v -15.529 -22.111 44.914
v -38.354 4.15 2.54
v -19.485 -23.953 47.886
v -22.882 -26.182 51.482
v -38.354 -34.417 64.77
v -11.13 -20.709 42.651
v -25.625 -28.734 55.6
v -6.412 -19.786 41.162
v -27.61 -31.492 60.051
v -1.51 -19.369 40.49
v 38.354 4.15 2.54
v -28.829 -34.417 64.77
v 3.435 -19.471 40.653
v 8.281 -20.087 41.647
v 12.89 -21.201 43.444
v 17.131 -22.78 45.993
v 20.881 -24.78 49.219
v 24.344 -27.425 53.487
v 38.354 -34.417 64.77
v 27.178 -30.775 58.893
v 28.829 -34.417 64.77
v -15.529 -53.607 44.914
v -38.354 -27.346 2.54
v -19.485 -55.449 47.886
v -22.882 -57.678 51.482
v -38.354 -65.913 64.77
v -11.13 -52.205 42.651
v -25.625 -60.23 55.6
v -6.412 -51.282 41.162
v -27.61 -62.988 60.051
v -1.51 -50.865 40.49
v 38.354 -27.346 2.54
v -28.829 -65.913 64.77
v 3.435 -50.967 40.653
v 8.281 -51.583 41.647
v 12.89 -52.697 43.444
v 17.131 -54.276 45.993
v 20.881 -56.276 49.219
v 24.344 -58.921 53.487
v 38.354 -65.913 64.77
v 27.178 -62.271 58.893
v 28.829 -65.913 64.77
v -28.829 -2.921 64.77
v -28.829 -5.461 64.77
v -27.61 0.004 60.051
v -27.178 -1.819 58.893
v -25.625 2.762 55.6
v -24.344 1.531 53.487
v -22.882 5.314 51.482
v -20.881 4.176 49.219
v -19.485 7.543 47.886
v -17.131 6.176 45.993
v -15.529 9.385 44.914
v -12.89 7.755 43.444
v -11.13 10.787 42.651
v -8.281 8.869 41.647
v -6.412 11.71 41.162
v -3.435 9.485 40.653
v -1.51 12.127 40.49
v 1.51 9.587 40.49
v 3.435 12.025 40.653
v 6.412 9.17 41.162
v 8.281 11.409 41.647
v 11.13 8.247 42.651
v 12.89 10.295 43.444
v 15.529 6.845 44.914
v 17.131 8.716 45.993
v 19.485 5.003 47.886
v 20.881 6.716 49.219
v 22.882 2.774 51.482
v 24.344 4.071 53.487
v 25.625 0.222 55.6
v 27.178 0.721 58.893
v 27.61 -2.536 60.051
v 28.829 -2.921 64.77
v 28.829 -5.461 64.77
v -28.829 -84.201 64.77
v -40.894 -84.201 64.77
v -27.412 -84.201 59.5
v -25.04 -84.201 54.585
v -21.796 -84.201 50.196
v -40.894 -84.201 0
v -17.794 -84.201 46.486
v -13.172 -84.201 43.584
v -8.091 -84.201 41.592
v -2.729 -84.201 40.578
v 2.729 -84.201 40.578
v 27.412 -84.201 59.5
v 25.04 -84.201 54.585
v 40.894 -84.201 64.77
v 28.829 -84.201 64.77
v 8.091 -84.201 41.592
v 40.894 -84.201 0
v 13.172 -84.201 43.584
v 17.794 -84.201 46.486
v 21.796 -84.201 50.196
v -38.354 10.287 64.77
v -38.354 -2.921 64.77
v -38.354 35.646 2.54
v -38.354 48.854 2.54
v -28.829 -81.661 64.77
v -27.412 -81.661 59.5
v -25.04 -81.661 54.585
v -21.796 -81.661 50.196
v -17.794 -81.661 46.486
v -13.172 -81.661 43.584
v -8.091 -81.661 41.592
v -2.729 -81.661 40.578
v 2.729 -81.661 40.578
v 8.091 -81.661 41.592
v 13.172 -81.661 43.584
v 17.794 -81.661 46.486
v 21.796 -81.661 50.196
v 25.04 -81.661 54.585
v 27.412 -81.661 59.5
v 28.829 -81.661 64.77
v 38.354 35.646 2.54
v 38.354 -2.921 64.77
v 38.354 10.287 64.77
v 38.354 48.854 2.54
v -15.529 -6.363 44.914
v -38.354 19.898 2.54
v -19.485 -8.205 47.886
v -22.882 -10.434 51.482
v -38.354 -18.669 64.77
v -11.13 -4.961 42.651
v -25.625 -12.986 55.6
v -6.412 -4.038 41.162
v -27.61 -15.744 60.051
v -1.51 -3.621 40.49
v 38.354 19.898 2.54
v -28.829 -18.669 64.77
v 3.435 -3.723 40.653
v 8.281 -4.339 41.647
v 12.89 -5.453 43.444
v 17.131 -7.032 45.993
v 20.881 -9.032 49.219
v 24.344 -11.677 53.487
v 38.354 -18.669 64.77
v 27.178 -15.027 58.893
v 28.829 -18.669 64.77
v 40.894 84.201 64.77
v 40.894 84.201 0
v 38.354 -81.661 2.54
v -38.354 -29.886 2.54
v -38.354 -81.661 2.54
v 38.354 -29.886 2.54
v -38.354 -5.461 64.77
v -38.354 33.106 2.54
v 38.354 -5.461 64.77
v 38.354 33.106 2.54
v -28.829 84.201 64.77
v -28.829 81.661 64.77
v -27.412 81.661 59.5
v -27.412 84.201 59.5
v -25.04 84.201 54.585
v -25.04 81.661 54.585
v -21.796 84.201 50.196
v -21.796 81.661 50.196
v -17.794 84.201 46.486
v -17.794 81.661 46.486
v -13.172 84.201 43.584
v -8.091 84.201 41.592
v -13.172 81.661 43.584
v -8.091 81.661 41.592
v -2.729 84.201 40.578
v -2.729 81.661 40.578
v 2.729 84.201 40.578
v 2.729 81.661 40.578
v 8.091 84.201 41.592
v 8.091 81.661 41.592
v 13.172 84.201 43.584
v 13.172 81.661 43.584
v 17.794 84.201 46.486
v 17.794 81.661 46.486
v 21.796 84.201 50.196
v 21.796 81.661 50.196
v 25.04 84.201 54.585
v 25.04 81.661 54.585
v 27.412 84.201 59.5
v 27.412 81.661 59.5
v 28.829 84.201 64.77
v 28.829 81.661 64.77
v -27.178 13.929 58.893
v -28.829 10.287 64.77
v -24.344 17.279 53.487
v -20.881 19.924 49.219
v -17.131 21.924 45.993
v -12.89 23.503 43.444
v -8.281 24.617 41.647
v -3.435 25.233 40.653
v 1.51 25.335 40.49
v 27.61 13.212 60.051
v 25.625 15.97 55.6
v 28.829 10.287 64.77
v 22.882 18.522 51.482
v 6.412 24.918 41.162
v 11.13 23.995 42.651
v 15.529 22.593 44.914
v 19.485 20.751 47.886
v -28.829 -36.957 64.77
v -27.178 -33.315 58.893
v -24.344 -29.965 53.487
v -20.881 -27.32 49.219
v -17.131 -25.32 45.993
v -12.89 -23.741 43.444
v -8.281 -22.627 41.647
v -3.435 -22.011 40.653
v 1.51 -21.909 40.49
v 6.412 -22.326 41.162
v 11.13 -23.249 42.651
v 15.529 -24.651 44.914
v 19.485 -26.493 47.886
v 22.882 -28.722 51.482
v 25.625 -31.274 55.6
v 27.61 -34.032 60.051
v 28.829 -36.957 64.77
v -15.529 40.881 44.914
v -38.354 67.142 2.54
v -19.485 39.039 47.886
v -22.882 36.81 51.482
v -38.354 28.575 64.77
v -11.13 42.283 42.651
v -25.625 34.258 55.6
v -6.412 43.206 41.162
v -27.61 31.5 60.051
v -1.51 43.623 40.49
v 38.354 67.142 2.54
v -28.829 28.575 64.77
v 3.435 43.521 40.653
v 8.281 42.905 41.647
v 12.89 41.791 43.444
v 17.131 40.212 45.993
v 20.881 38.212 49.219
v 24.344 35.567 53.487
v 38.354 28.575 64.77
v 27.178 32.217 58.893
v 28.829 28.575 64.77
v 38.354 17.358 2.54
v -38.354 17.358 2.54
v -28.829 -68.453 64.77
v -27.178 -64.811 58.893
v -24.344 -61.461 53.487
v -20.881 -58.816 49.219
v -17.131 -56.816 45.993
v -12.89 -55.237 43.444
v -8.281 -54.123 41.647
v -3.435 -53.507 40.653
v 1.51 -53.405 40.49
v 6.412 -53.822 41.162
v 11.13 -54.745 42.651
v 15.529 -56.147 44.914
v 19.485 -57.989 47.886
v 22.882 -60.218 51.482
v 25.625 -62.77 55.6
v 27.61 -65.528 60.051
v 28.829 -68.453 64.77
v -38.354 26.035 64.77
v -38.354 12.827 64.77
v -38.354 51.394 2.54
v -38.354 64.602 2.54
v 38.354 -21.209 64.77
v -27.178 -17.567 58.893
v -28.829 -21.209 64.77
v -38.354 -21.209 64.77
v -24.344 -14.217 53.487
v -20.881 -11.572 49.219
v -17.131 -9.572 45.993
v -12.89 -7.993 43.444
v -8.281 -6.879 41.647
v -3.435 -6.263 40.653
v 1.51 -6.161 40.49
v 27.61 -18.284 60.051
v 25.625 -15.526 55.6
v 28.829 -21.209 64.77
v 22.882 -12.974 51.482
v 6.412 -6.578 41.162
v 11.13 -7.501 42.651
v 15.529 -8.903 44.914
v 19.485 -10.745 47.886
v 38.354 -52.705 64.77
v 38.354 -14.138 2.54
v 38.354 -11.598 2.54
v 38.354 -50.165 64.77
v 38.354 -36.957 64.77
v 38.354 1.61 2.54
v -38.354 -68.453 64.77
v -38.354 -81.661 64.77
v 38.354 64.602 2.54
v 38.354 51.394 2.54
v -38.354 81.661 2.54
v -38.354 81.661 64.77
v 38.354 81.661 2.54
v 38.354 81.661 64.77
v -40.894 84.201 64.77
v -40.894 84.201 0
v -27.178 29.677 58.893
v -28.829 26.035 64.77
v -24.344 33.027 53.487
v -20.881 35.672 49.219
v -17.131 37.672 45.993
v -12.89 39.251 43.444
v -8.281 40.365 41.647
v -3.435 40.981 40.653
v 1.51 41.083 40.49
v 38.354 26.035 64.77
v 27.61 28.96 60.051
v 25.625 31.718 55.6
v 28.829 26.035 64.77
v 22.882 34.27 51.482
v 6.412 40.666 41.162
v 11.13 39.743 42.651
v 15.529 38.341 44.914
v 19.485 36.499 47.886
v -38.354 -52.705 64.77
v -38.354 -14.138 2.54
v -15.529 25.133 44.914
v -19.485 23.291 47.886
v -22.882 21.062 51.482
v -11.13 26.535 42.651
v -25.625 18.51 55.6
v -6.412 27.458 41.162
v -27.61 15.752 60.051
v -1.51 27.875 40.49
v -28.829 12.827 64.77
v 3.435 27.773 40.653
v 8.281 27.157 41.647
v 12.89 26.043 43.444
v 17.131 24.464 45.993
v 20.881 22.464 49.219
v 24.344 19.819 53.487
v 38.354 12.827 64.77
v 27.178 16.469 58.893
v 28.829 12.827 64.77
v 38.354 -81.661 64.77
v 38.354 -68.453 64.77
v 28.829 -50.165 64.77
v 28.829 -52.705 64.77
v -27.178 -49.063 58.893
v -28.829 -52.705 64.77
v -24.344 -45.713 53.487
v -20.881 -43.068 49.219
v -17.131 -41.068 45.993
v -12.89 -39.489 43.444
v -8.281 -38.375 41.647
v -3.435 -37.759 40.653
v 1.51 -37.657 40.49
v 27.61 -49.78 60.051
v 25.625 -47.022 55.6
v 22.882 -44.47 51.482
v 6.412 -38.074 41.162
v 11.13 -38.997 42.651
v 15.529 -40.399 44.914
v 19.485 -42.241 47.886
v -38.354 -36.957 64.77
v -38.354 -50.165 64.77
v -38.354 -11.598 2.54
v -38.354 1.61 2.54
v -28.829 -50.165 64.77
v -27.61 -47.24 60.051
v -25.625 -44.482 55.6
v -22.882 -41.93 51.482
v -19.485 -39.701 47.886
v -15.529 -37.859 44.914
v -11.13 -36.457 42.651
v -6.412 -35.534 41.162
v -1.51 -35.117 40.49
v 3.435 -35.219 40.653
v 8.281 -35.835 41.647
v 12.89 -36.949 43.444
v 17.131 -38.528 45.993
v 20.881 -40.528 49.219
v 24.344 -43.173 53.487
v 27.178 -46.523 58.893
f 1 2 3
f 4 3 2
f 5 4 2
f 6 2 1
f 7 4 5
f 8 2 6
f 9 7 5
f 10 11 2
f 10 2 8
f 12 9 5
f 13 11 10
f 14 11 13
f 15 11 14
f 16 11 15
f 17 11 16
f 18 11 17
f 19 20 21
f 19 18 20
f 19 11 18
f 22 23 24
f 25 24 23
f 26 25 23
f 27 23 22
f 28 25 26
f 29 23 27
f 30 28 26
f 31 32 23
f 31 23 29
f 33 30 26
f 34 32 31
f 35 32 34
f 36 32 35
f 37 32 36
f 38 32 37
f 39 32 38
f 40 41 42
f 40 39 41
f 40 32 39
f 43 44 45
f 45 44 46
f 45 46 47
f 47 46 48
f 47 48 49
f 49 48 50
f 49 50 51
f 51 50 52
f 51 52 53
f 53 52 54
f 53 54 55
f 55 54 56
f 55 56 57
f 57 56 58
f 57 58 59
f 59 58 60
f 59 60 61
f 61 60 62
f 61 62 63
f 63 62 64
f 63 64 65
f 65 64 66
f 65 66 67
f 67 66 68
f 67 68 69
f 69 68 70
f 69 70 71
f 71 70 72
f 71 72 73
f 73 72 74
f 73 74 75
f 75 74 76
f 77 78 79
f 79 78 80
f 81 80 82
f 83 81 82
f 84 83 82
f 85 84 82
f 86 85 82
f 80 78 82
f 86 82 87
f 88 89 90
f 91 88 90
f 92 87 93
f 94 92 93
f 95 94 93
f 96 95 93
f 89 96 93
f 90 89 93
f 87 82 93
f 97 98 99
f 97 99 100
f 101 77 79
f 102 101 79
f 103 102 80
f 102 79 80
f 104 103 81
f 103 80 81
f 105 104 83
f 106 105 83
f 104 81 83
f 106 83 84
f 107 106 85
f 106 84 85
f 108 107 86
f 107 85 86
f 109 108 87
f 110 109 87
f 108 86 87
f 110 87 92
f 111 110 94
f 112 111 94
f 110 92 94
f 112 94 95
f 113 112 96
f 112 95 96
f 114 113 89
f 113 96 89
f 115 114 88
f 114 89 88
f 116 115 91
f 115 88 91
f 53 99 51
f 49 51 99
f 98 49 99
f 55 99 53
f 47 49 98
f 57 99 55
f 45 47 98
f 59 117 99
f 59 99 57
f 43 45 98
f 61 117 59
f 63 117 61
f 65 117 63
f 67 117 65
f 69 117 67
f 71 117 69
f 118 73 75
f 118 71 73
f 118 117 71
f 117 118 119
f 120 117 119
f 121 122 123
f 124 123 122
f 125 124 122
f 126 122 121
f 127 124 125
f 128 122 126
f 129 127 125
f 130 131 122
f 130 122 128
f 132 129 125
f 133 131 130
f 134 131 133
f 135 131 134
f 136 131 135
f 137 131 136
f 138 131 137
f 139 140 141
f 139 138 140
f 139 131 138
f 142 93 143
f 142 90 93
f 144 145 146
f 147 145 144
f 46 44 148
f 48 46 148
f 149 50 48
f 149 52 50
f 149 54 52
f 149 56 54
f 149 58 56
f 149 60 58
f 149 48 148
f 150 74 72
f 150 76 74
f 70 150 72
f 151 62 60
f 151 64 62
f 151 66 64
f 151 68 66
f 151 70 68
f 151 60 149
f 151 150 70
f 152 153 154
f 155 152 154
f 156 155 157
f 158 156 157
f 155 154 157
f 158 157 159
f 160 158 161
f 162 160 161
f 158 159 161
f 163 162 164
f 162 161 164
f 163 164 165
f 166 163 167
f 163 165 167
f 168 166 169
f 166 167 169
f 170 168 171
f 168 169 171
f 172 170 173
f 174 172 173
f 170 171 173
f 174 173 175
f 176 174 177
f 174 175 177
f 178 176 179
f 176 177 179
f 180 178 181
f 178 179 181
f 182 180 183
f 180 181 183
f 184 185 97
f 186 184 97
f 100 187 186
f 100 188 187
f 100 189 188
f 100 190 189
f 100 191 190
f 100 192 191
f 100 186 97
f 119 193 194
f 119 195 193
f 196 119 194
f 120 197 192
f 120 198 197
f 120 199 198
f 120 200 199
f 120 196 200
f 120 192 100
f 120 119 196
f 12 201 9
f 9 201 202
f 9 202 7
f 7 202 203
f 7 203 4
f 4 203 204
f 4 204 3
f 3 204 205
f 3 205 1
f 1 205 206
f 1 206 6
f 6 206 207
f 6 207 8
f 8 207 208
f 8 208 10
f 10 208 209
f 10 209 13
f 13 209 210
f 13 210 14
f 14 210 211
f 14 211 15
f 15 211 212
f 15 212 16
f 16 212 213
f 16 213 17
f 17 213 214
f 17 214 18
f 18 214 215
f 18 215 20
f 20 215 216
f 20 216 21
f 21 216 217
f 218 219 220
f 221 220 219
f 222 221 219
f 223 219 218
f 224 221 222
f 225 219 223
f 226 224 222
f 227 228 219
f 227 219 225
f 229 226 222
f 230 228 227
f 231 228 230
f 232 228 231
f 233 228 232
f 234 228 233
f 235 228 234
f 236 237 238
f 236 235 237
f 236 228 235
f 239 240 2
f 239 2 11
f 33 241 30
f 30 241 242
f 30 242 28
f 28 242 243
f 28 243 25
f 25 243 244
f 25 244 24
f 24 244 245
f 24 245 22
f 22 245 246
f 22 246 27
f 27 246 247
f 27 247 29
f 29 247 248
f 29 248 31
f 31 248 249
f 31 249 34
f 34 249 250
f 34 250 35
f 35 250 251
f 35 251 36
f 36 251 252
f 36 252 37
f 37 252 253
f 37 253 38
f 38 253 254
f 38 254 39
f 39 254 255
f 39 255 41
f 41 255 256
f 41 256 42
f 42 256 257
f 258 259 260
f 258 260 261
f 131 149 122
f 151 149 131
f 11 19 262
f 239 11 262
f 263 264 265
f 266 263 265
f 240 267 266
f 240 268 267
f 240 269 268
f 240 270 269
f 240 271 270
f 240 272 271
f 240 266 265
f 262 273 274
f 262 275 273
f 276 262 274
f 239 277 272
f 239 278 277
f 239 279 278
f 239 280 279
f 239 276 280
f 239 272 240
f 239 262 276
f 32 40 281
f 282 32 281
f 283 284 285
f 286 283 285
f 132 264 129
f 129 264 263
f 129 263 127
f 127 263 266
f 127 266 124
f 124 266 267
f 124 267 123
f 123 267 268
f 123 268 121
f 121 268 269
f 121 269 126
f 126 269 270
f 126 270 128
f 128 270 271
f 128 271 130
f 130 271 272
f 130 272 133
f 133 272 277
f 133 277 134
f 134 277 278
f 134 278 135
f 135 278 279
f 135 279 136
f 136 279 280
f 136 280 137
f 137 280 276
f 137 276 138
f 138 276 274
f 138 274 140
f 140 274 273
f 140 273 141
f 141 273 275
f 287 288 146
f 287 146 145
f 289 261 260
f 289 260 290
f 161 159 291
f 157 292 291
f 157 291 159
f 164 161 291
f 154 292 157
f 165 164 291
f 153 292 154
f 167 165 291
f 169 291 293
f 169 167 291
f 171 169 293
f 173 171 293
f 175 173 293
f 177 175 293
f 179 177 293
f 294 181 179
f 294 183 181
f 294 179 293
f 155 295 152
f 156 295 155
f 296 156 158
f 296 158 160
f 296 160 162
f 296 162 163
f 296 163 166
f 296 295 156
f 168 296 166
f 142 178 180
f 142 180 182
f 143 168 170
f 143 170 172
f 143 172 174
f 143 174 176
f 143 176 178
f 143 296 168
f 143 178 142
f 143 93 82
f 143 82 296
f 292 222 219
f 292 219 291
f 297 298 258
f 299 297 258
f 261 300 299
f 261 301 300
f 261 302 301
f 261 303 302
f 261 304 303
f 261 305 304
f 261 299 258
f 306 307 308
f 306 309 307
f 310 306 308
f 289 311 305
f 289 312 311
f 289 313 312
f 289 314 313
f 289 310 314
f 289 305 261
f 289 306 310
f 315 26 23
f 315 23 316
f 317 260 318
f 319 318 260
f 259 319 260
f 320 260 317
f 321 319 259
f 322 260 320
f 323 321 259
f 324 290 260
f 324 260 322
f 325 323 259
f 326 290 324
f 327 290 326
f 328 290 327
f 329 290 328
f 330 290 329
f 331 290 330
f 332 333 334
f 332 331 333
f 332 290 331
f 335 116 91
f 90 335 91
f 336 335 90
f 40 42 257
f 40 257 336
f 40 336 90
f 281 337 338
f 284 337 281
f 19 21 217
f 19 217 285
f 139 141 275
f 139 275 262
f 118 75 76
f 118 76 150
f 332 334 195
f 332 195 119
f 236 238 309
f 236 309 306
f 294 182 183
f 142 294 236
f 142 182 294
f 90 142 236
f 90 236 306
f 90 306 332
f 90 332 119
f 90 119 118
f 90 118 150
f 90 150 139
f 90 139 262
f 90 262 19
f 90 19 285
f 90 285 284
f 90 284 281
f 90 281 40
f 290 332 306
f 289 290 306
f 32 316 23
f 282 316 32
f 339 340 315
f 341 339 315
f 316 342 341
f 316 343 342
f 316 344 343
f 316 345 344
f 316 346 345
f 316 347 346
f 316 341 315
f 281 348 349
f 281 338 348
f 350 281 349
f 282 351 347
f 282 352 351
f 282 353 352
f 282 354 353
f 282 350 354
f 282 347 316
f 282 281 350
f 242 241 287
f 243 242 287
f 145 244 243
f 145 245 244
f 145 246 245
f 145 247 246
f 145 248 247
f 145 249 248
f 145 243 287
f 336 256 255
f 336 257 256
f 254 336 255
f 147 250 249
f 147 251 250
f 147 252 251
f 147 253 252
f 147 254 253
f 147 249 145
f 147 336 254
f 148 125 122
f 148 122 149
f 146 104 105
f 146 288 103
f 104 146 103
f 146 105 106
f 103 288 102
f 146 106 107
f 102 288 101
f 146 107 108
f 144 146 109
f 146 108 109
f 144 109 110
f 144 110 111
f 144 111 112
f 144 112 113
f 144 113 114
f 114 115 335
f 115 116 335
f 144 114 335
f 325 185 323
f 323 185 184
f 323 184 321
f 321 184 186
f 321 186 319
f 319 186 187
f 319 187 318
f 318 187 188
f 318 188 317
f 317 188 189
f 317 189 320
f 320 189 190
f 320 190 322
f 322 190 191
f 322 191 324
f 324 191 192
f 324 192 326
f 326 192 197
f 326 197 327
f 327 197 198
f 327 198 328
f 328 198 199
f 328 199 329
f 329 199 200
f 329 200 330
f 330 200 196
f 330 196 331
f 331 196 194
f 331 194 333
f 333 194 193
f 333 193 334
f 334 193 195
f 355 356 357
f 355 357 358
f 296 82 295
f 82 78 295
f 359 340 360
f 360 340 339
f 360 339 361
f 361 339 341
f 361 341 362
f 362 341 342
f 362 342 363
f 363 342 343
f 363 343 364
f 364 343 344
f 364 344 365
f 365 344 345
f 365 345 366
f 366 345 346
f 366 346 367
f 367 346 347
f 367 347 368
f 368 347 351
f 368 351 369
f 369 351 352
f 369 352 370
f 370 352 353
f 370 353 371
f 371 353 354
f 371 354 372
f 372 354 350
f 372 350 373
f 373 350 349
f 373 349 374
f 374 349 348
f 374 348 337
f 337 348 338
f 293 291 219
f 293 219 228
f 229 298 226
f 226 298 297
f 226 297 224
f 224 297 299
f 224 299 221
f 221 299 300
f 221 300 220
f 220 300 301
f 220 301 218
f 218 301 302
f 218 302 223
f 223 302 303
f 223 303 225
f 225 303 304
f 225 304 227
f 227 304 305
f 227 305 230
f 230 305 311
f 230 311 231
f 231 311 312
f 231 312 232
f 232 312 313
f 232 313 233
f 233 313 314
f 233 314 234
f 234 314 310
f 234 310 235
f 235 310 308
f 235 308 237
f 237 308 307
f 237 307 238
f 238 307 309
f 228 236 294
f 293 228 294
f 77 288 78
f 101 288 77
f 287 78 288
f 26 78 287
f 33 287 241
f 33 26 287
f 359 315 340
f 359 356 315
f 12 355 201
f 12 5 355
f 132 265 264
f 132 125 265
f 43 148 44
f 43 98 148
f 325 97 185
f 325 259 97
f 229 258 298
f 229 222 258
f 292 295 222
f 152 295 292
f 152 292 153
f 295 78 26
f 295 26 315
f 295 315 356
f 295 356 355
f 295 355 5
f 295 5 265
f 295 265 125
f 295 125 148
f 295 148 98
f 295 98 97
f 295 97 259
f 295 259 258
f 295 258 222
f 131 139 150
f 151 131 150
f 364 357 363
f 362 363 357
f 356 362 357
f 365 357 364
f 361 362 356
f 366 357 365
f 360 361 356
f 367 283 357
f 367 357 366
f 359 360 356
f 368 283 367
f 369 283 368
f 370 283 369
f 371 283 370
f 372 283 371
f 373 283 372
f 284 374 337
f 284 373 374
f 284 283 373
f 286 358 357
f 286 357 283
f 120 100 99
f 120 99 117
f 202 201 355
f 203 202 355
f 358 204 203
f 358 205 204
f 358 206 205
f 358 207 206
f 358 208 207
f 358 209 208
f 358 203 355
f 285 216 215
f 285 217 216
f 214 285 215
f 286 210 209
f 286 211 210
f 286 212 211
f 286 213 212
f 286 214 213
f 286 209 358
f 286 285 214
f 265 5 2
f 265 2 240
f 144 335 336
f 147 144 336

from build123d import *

# Parameters (mm, degrees)
F0_W     = 81.788
F0_H     = 168.402
F1_DEPTH = 64.77
F2_W     = 76.708
F2_H     = 163.322
F3_DEPTH = 62.23
F5_DEPTH = 81.788
F7_DEPTH = 177.8


with BuildPart() as f1:
    # F0 (on Top) → F1 (new body)
    with BuildSketch(Plane.XY):
        Rectangle(F0_W, F0_H)
    extrude(amount=F1_DEPTH)

    # F2 (on face) → F3 (cut)
    with BuildSketch(Plane.XY.offset(64.77)):
        Rectangle(F2_W, F2_H)
    extrude(amount=-F3_DEPTH, mode=Mode.SUBTRACT)

    # F4 (on face) → F5 (join)
    with BuildSketch(Plane.YZ.offset(40.894)):
        Polygon((26.035, 64.77), (66.175841, 0), (68.715841, 0), (28.575, 64.77), align=None)
        Polygon((10.287, 64.77), (50.427841, 0), (52.967841, 0), (12.827, 64.77), align=None)
        Polygon((-5.461, 64.77), (34.679841, 0), (37.219841, 0), (-2.921, 64.77), align=None)
        Polygon((-21.209, 64.77), (18.931841, 0), (21.471841, 0), (-18.669, 64.77), align=None)
        Polygon((-36.957, 64.77), (3.183841, 0), (5.723841, 0), (-34.417, 64.77), align=None)
        Polygon((-52.705, 64.77), (-12.564159, 0), (-10.024159, 0), (-50.165, 64.77), align=None)
        Polygon((-68.453, 64.77), (-28.312159, 0), (-25.772159, 0), (-65.913, 64.77), align=None)
    extrude(amount=-F5_DEPTH)

    # F6 (on face) → F7 (cut)
    with BuildSketch(Plane.XZ.offset(84.201)):
        with BuildLine():
            Line((28.829, 64.77), (-28.829, 64.77))
            ThreePointArc((-28.829, 64.77), (0, 40.450578), (28.829, 64.77))
        make_face()
    extrude(amount=-F7_DEPTH, mode=Mode.SUBTRACT)


solid = f1.part
